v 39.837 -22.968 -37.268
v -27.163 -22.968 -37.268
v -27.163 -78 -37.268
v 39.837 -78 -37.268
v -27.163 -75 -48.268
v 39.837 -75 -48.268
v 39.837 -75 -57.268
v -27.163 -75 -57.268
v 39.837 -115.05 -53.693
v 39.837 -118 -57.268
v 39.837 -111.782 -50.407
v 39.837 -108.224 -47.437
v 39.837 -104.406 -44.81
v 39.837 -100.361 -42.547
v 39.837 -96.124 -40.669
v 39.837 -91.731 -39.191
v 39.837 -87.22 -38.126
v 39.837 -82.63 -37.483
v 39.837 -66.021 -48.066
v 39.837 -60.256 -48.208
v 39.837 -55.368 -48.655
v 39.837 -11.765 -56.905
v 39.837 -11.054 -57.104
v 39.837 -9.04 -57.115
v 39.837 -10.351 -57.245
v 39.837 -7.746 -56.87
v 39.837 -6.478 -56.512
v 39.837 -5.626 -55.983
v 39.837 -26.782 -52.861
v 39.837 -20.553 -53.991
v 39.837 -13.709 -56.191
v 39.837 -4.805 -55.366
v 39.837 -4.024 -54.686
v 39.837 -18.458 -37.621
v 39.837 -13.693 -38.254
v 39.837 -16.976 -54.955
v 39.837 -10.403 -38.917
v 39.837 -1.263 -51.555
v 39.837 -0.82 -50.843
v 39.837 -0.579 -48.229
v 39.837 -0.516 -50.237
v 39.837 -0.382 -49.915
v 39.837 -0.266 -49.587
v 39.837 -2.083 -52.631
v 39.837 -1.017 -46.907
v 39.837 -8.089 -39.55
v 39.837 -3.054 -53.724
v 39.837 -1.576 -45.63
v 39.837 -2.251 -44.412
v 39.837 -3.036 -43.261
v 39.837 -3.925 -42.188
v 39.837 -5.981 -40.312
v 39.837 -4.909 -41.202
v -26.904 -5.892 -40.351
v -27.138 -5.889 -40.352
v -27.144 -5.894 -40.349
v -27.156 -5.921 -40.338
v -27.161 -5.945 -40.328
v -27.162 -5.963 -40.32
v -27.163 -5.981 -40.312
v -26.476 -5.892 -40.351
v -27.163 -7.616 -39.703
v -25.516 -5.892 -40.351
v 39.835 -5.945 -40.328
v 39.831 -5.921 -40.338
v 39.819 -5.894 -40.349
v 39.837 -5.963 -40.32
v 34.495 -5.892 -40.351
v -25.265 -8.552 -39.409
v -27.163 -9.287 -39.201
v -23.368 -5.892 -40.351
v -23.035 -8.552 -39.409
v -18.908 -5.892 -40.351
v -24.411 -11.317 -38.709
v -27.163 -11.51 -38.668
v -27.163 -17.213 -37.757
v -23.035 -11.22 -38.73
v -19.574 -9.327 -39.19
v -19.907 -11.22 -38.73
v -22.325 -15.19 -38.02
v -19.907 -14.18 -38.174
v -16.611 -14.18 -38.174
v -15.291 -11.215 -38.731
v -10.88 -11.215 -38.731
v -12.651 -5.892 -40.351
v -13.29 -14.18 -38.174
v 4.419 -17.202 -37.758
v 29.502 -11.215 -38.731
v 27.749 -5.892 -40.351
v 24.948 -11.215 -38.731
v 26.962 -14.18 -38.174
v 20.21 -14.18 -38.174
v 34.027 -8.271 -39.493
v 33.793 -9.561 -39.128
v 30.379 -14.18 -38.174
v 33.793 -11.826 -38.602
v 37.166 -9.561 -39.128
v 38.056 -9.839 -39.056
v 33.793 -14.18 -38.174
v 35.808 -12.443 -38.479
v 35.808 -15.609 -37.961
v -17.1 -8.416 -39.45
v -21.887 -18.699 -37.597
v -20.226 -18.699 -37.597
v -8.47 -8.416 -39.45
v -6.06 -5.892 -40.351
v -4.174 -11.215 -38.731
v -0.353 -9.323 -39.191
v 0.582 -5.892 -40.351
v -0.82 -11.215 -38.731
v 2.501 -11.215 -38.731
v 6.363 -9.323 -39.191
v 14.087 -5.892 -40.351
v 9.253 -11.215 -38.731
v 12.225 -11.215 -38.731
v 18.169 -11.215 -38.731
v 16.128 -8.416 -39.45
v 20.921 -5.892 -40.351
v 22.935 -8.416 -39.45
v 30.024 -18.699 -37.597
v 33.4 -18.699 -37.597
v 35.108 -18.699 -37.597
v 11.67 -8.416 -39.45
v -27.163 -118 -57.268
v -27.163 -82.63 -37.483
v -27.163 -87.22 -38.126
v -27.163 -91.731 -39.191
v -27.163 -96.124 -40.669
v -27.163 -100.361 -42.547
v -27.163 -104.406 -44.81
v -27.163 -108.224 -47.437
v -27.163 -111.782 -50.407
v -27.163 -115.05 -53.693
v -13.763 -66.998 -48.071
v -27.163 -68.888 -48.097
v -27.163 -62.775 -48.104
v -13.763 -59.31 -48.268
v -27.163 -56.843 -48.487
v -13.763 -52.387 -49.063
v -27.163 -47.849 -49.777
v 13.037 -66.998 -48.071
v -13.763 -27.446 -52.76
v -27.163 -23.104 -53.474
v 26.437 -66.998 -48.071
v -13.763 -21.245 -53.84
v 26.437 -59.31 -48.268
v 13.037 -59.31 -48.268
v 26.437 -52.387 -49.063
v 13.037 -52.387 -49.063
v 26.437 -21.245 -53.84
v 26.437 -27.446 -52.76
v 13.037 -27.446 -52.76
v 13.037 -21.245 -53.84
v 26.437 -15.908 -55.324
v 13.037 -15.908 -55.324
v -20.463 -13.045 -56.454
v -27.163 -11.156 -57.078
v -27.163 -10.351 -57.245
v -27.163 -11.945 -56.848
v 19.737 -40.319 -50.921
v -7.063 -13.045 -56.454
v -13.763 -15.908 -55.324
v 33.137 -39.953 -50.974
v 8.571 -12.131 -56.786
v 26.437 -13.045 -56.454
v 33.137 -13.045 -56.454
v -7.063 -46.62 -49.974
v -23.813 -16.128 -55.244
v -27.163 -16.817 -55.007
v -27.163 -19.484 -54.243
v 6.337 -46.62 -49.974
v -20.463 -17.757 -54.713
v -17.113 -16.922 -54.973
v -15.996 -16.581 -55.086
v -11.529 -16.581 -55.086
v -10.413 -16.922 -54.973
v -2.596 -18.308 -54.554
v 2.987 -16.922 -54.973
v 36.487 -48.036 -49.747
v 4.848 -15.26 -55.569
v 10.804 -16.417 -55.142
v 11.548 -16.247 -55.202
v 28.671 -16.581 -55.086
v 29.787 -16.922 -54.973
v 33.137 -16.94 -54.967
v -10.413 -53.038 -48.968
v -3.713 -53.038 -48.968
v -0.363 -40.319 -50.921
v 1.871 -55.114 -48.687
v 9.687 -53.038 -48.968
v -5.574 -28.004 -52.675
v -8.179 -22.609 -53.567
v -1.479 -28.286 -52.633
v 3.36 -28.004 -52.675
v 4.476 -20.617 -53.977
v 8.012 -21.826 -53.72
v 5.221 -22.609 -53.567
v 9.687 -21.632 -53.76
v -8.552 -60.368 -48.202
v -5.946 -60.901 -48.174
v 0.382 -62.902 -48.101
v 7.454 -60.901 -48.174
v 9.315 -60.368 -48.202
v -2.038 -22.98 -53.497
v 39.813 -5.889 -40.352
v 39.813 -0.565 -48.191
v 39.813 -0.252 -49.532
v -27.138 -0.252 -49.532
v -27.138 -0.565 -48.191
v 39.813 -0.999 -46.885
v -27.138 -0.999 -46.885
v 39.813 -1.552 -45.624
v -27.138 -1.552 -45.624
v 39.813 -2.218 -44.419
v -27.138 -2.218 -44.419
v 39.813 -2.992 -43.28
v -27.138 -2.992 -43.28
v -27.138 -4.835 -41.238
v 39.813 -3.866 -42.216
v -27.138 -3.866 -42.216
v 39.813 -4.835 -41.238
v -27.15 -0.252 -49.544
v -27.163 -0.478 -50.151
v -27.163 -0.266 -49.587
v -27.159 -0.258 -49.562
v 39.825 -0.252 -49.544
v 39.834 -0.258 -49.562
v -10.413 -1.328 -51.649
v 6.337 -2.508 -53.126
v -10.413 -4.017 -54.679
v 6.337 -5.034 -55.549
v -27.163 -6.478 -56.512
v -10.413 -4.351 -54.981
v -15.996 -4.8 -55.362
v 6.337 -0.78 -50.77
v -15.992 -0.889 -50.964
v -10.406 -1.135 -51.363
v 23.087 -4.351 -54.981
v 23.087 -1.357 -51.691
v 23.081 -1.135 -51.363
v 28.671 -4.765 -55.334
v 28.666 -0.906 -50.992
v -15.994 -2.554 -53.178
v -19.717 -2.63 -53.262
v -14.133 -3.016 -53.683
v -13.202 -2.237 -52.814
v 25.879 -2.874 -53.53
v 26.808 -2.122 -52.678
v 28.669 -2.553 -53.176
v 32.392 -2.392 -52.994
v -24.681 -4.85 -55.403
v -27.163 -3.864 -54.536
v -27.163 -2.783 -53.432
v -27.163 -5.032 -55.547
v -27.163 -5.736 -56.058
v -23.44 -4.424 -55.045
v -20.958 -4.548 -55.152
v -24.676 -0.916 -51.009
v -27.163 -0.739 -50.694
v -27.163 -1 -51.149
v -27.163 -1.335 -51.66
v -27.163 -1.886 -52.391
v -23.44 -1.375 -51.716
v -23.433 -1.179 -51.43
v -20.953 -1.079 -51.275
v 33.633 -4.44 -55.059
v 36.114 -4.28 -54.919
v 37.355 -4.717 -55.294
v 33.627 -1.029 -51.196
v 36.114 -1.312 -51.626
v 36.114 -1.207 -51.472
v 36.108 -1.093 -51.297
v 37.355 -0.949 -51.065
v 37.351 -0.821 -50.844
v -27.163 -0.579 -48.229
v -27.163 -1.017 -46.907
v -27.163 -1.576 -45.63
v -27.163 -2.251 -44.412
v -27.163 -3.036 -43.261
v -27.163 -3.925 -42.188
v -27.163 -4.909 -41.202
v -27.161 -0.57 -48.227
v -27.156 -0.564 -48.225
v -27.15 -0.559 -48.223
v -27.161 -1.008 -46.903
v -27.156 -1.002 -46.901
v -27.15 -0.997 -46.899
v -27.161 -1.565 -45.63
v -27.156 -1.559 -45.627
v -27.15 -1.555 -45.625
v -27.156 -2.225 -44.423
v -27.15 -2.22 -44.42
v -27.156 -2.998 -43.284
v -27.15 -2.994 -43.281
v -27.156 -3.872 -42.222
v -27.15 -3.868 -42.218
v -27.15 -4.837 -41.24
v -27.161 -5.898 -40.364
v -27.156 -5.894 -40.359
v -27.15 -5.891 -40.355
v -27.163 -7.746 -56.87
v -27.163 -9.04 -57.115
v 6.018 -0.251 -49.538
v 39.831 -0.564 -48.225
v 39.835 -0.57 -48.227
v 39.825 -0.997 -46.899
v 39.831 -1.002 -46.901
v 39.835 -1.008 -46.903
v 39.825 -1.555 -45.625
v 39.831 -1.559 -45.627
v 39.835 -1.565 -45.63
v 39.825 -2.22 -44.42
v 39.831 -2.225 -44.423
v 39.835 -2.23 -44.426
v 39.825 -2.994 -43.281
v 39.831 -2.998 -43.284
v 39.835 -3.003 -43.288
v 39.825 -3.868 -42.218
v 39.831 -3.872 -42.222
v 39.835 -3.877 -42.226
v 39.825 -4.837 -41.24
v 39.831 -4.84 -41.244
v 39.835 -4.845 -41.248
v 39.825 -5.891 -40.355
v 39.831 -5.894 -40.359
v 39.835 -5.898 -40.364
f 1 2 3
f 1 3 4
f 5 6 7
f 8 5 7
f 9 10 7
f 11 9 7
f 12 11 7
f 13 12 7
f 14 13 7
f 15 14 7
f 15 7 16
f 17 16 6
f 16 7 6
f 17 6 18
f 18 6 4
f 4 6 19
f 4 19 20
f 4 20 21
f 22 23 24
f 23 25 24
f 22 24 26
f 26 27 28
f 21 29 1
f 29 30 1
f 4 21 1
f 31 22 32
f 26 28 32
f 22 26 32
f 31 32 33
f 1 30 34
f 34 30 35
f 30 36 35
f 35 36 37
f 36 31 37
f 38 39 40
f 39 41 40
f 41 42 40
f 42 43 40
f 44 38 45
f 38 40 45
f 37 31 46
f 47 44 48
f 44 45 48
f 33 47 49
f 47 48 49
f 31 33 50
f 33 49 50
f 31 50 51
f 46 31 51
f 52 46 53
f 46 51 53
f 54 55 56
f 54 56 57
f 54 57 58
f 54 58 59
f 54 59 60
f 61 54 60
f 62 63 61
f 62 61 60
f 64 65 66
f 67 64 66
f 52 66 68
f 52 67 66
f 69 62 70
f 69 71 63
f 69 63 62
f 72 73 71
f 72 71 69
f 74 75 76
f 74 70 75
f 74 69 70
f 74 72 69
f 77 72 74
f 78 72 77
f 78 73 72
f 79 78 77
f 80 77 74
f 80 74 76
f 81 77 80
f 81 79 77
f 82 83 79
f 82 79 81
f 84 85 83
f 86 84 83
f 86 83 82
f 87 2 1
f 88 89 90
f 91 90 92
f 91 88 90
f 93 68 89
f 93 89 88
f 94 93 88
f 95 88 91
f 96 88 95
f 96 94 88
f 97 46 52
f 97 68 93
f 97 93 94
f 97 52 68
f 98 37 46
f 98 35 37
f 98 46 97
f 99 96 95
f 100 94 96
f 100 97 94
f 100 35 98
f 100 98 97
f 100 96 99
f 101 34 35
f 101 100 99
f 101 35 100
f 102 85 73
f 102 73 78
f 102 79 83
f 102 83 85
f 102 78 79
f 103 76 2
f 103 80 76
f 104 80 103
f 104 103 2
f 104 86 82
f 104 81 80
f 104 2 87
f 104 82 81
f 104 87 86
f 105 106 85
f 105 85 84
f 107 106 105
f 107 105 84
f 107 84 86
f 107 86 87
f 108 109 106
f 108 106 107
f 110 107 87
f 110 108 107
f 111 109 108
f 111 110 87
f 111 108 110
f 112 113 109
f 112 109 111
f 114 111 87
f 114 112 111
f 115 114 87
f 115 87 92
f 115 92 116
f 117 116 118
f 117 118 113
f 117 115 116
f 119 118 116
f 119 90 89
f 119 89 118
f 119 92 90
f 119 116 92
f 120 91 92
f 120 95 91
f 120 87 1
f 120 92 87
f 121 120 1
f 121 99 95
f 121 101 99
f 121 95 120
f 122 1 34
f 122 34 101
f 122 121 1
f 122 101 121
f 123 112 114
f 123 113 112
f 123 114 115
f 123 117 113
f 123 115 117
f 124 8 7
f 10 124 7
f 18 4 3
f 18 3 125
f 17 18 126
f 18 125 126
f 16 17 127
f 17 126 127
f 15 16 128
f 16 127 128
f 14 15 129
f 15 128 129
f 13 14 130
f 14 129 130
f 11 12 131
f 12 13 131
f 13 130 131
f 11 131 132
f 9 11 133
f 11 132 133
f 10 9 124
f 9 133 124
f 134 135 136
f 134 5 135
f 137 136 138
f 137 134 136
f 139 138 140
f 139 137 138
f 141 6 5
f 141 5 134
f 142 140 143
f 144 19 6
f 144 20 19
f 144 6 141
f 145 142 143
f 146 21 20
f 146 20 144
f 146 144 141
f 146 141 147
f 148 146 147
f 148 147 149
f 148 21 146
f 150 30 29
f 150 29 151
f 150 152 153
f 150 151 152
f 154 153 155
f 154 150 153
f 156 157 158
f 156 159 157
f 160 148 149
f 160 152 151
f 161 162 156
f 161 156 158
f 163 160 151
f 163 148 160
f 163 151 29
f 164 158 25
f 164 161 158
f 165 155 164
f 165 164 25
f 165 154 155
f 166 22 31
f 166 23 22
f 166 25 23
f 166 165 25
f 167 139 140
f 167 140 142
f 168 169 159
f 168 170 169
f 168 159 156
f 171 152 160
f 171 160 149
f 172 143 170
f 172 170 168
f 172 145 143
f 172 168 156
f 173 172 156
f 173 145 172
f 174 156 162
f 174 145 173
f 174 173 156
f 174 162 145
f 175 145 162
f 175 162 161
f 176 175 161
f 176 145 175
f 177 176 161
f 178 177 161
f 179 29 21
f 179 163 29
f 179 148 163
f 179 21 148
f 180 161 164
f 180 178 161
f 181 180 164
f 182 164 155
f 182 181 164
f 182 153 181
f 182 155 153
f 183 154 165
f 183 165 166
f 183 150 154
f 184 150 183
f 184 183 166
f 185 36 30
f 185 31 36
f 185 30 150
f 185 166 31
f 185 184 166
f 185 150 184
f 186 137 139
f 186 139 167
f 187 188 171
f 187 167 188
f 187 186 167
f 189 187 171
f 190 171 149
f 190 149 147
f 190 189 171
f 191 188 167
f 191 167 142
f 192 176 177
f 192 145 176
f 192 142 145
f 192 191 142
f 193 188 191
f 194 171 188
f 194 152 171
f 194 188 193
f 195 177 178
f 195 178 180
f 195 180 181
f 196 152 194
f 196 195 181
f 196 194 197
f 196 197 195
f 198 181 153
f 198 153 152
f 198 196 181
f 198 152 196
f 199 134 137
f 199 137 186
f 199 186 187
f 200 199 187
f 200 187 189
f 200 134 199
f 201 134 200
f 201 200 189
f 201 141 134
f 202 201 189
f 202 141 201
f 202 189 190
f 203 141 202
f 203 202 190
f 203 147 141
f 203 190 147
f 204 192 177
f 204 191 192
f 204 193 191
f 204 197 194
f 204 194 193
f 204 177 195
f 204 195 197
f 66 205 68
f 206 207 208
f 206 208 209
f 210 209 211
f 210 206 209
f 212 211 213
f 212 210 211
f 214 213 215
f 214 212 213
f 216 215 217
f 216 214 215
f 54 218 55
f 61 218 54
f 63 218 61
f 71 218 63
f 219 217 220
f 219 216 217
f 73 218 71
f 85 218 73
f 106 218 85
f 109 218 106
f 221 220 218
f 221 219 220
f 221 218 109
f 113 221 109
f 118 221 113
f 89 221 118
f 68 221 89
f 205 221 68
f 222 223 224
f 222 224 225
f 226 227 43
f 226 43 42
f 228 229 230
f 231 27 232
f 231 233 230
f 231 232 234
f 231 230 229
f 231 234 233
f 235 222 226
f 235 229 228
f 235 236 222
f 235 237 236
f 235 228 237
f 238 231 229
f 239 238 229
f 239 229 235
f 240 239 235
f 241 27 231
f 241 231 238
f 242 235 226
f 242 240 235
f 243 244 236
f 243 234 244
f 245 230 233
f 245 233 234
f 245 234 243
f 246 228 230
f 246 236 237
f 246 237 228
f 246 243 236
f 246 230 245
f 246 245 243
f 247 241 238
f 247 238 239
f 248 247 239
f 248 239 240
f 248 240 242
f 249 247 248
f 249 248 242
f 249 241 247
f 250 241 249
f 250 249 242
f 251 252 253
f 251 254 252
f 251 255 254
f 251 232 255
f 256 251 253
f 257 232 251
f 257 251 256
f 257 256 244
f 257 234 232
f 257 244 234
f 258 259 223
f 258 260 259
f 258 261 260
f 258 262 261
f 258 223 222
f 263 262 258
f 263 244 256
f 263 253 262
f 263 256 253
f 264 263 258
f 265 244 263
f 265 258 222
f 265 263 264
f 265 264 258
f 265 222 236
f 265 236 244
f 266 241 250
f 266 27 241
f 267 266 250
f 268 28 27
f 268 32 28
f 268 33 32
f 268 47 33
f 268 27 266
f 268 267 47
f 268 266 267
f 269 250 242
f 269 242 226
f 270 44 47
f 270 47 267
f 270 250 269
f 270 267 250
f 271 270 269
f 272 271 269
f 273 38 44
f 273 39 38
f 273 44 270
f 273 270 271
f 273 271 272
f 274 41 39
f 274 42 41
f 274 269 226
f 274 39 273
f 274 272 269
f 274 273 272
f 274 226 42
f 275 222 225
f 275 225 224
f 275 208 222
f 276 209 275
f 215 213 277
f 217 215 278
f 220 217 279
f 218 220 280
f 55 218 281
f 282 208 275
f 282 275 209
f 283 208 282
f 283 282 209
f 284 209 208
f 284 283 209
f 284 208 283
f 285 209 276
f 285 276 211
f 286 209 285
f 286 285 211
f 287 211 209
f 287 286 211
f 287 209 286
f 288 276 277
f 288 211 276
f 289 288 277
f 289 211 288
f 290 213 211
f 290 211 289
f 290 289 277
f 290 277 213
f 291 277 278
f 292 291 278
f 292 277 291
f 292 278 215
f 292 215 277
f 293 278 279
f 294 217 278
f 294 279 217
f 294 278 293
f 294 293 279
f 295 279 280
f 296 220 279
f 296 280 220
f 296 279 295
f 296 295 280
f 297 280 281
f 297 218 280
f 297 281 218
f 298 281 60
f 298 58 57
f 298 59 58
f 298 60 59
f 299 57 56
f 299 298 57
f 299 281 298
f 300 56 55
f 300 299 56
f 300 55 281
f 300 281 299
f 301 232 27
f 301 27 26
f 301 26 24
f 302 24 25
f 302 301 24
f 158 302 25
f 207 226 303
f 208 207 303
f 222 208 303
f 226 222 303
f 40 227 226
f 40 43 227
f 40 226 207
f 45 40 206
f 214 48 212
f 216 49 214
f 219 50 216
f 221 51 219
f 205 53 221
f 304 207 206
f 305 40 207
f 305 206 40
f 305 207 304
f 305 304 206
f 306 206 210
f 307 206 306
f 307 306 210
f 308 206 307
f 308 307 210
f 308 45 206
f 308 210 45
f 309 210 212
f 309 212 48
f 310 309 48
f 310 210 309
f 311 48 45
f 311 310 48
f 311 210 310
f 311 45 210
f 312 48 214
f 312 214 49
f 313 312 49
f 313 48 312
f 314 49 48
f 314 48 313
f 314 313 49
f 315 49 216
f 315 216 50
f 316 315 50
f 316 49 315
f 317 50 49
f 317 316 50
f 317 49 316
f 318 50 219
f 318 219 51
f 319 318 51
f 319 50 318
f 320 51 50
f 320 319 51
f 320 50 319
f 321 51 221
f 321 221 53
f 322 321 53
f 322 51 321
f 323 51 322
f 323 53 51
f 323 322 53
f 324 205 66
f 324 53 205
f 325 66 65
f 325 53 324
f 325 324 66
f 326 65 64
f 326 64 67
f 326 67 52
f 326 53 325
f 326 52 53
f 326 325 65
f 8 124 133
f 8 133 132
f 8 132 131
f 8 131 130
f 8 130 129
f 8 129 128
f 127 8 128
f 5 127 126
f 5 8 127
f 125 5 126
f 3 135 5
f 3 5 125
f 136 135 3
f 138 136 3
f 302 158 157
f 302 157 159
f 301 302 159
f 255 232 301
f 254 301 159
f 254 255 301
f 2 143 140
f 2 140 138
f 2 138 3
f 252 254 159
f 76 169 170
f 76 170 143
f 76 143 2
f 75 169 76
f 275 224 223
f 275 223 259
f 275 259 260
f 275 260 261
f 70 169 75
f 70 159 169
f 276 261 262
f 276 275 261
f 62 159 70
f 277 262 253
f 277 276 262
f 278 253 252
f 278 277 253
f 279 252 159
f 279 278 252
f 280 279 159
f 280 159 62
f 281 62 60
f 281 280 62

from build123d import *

# Parameters (mm, degrees)
F0_W        = 67
F0_H        = 20
F1_DEPTH    = 118
F3_T1_DEPTH = 267
F4_R        = 15
F5_T1_DEPTH = 122.9016994375
F6_DEPTH    = 67.001
F7_R        = 0.0241421356


# Not quite as in the source:
# - a fillet or chamfer that OpenCascade refuses, or shapes differently, is made with other operations: its cross-section is extruded or revolved along the edge and cut away or added


with BuildPart() as f1:
    # F0 (on Front) → F1 (new body)
    with BuildSketch(Plane.XZ):
        with Locations((6.337375957, -47.2683286667)):
            Rectangle(F0_W, F0_H)
    extrude(amount=F1_DEPTH)

    # F3: fillet of radius 50 on 1 edges, made by hand

    # F3_s2 → F3_t1 (cut)
    with BuildSketch(Plane.YZ.offset(-127.162624043)):
        with BuildLine():
            ThreePointArc((-78, -37.2683286667), (-100.360679775, -42.5469691167), (-118, -57.2683286667))
            Line((-118, -57.2683286667), (-118, -37.2683286667))
            Line((-118, -37.2683286667), (-78, -37.2683286667))
        make_face()
    extrude(amount=F3_T1_DEPTH, mode=Mode.SUBTRACT)

    # F4
    f4_edges = [f1.edges().sort_by_distance(p)[0] for p in [
        (6.337376, -78, -37.268329),
        (6.337376, 0, -37.268329),
    ]]
    fillet(f4_edges, radius=F4_R)

    # F5: fillet of radius 15 on 1 edges, made by hand

    # F5_s2 → F5_t1 (cut)
    with BuildSketch(Plane.YZ.offset(-55.1134737617)):
        with BuildLine():
            ThreePointArc((0, -52.2683286667), (-5.0566155305, -55.9613926043), (-11.1803398875, -57.2683286667))
            Line((-11.1803398875, -57.2683286667), (0, -57.2683286667))
            Line((0, -57.2683286667), (0, -52.2683286667))
        make_face()
    extrude(amount=F5_T1_DEPTH, mode=Mode.SUBTRACT)

    # F2 (on face) → F6 (cut, through all)
    with BuildSketch(Plane.YZ.offset(39.837375957)):
        with BuildLine():
            Line((-75, -48.2683286667), (-75, -57.2683286667))
            Line((-75, -57.2683286667), (-10.1939006259, -57.2683286667))
            add(Edge.make_bspline(
                [(-75, -48.2683286667), (-69.6300083872, -48.0932397516), (-59.1455400015, -47.7513929988), (-45.397034891, -50.3214203198), (-27.6071602735, -52.6118617406), (-16.9114345494, -54.5205994978), (-11.9954400696, -57.0260607697), (-10.1939006259, -57.2683286667)],
                knots=[0, 0, 0, 0, 0.1168750086, 0.2281888728, 0.353191241, 0.4546285253, 0.5170585623, 0.5170585623, 0.5170585623, 0.5170585623], degree=3))
        make_face()
        with BuildLine():
            add(Edge.make_bspline(
                [(-8.5831200704, -57.2683286667), (-6.3182593416, -56.9222504863), (-2.2304747887, -53.2529046852), (-0.154748351, -50.0842721126), (0, -48.2683286667)],
                knots=[0.5358591005, 0.5358591005, 0.5358591005, 0.5358591005, 0.6158678035, 0.6848581677, 0.6848581677, 0.6848581677, 0.6848581677], degree=3))
            Line((-8.5831200704, -57.2683286667), (0, -57.2683286667))
            Line((0, -57.2683286667), (0, -48.2683286667))
        make_face()
        with BuildLine():
            Line((0, -37.2683286667), (-22.9681972414, -37.2683286667))
            add(Edge.make_bspline(
                [(0, -47.2220127929), (-0.1541112697, -45.3649297857), (-3.0721745265, -39.2455424759), (-16.4826181453, -37.6339263761), (-22.9681972414, -37.2683286667)],
                knots=[0.69771165, 0.69771165, 0.69771165, 0.69771165, 0.7644699458, 0.8970561658, 0.8970561658, 0.8970561658, 0.8970561658], degree=3))
            Line((0, -47.2220127929), (0, -37.2683286667))
        make_face()
    extrude(amount=-F6_DEPTH, mode=Mode.SUBTRACT)

    # F7
    f7_edges = [f1.edges().sort_by_distance(p)[0] for p in [
        (6.337376, -0.250596, -49.53793),
        (-27.162624, -2.21712, -44.41989),
        (6.337376, -5.891526, -40.350456),
        (39.837376, -2.21712, -44.41989),
    ]]
    fillet(f7_edges, radius=F7_R)


solid = f1.part
